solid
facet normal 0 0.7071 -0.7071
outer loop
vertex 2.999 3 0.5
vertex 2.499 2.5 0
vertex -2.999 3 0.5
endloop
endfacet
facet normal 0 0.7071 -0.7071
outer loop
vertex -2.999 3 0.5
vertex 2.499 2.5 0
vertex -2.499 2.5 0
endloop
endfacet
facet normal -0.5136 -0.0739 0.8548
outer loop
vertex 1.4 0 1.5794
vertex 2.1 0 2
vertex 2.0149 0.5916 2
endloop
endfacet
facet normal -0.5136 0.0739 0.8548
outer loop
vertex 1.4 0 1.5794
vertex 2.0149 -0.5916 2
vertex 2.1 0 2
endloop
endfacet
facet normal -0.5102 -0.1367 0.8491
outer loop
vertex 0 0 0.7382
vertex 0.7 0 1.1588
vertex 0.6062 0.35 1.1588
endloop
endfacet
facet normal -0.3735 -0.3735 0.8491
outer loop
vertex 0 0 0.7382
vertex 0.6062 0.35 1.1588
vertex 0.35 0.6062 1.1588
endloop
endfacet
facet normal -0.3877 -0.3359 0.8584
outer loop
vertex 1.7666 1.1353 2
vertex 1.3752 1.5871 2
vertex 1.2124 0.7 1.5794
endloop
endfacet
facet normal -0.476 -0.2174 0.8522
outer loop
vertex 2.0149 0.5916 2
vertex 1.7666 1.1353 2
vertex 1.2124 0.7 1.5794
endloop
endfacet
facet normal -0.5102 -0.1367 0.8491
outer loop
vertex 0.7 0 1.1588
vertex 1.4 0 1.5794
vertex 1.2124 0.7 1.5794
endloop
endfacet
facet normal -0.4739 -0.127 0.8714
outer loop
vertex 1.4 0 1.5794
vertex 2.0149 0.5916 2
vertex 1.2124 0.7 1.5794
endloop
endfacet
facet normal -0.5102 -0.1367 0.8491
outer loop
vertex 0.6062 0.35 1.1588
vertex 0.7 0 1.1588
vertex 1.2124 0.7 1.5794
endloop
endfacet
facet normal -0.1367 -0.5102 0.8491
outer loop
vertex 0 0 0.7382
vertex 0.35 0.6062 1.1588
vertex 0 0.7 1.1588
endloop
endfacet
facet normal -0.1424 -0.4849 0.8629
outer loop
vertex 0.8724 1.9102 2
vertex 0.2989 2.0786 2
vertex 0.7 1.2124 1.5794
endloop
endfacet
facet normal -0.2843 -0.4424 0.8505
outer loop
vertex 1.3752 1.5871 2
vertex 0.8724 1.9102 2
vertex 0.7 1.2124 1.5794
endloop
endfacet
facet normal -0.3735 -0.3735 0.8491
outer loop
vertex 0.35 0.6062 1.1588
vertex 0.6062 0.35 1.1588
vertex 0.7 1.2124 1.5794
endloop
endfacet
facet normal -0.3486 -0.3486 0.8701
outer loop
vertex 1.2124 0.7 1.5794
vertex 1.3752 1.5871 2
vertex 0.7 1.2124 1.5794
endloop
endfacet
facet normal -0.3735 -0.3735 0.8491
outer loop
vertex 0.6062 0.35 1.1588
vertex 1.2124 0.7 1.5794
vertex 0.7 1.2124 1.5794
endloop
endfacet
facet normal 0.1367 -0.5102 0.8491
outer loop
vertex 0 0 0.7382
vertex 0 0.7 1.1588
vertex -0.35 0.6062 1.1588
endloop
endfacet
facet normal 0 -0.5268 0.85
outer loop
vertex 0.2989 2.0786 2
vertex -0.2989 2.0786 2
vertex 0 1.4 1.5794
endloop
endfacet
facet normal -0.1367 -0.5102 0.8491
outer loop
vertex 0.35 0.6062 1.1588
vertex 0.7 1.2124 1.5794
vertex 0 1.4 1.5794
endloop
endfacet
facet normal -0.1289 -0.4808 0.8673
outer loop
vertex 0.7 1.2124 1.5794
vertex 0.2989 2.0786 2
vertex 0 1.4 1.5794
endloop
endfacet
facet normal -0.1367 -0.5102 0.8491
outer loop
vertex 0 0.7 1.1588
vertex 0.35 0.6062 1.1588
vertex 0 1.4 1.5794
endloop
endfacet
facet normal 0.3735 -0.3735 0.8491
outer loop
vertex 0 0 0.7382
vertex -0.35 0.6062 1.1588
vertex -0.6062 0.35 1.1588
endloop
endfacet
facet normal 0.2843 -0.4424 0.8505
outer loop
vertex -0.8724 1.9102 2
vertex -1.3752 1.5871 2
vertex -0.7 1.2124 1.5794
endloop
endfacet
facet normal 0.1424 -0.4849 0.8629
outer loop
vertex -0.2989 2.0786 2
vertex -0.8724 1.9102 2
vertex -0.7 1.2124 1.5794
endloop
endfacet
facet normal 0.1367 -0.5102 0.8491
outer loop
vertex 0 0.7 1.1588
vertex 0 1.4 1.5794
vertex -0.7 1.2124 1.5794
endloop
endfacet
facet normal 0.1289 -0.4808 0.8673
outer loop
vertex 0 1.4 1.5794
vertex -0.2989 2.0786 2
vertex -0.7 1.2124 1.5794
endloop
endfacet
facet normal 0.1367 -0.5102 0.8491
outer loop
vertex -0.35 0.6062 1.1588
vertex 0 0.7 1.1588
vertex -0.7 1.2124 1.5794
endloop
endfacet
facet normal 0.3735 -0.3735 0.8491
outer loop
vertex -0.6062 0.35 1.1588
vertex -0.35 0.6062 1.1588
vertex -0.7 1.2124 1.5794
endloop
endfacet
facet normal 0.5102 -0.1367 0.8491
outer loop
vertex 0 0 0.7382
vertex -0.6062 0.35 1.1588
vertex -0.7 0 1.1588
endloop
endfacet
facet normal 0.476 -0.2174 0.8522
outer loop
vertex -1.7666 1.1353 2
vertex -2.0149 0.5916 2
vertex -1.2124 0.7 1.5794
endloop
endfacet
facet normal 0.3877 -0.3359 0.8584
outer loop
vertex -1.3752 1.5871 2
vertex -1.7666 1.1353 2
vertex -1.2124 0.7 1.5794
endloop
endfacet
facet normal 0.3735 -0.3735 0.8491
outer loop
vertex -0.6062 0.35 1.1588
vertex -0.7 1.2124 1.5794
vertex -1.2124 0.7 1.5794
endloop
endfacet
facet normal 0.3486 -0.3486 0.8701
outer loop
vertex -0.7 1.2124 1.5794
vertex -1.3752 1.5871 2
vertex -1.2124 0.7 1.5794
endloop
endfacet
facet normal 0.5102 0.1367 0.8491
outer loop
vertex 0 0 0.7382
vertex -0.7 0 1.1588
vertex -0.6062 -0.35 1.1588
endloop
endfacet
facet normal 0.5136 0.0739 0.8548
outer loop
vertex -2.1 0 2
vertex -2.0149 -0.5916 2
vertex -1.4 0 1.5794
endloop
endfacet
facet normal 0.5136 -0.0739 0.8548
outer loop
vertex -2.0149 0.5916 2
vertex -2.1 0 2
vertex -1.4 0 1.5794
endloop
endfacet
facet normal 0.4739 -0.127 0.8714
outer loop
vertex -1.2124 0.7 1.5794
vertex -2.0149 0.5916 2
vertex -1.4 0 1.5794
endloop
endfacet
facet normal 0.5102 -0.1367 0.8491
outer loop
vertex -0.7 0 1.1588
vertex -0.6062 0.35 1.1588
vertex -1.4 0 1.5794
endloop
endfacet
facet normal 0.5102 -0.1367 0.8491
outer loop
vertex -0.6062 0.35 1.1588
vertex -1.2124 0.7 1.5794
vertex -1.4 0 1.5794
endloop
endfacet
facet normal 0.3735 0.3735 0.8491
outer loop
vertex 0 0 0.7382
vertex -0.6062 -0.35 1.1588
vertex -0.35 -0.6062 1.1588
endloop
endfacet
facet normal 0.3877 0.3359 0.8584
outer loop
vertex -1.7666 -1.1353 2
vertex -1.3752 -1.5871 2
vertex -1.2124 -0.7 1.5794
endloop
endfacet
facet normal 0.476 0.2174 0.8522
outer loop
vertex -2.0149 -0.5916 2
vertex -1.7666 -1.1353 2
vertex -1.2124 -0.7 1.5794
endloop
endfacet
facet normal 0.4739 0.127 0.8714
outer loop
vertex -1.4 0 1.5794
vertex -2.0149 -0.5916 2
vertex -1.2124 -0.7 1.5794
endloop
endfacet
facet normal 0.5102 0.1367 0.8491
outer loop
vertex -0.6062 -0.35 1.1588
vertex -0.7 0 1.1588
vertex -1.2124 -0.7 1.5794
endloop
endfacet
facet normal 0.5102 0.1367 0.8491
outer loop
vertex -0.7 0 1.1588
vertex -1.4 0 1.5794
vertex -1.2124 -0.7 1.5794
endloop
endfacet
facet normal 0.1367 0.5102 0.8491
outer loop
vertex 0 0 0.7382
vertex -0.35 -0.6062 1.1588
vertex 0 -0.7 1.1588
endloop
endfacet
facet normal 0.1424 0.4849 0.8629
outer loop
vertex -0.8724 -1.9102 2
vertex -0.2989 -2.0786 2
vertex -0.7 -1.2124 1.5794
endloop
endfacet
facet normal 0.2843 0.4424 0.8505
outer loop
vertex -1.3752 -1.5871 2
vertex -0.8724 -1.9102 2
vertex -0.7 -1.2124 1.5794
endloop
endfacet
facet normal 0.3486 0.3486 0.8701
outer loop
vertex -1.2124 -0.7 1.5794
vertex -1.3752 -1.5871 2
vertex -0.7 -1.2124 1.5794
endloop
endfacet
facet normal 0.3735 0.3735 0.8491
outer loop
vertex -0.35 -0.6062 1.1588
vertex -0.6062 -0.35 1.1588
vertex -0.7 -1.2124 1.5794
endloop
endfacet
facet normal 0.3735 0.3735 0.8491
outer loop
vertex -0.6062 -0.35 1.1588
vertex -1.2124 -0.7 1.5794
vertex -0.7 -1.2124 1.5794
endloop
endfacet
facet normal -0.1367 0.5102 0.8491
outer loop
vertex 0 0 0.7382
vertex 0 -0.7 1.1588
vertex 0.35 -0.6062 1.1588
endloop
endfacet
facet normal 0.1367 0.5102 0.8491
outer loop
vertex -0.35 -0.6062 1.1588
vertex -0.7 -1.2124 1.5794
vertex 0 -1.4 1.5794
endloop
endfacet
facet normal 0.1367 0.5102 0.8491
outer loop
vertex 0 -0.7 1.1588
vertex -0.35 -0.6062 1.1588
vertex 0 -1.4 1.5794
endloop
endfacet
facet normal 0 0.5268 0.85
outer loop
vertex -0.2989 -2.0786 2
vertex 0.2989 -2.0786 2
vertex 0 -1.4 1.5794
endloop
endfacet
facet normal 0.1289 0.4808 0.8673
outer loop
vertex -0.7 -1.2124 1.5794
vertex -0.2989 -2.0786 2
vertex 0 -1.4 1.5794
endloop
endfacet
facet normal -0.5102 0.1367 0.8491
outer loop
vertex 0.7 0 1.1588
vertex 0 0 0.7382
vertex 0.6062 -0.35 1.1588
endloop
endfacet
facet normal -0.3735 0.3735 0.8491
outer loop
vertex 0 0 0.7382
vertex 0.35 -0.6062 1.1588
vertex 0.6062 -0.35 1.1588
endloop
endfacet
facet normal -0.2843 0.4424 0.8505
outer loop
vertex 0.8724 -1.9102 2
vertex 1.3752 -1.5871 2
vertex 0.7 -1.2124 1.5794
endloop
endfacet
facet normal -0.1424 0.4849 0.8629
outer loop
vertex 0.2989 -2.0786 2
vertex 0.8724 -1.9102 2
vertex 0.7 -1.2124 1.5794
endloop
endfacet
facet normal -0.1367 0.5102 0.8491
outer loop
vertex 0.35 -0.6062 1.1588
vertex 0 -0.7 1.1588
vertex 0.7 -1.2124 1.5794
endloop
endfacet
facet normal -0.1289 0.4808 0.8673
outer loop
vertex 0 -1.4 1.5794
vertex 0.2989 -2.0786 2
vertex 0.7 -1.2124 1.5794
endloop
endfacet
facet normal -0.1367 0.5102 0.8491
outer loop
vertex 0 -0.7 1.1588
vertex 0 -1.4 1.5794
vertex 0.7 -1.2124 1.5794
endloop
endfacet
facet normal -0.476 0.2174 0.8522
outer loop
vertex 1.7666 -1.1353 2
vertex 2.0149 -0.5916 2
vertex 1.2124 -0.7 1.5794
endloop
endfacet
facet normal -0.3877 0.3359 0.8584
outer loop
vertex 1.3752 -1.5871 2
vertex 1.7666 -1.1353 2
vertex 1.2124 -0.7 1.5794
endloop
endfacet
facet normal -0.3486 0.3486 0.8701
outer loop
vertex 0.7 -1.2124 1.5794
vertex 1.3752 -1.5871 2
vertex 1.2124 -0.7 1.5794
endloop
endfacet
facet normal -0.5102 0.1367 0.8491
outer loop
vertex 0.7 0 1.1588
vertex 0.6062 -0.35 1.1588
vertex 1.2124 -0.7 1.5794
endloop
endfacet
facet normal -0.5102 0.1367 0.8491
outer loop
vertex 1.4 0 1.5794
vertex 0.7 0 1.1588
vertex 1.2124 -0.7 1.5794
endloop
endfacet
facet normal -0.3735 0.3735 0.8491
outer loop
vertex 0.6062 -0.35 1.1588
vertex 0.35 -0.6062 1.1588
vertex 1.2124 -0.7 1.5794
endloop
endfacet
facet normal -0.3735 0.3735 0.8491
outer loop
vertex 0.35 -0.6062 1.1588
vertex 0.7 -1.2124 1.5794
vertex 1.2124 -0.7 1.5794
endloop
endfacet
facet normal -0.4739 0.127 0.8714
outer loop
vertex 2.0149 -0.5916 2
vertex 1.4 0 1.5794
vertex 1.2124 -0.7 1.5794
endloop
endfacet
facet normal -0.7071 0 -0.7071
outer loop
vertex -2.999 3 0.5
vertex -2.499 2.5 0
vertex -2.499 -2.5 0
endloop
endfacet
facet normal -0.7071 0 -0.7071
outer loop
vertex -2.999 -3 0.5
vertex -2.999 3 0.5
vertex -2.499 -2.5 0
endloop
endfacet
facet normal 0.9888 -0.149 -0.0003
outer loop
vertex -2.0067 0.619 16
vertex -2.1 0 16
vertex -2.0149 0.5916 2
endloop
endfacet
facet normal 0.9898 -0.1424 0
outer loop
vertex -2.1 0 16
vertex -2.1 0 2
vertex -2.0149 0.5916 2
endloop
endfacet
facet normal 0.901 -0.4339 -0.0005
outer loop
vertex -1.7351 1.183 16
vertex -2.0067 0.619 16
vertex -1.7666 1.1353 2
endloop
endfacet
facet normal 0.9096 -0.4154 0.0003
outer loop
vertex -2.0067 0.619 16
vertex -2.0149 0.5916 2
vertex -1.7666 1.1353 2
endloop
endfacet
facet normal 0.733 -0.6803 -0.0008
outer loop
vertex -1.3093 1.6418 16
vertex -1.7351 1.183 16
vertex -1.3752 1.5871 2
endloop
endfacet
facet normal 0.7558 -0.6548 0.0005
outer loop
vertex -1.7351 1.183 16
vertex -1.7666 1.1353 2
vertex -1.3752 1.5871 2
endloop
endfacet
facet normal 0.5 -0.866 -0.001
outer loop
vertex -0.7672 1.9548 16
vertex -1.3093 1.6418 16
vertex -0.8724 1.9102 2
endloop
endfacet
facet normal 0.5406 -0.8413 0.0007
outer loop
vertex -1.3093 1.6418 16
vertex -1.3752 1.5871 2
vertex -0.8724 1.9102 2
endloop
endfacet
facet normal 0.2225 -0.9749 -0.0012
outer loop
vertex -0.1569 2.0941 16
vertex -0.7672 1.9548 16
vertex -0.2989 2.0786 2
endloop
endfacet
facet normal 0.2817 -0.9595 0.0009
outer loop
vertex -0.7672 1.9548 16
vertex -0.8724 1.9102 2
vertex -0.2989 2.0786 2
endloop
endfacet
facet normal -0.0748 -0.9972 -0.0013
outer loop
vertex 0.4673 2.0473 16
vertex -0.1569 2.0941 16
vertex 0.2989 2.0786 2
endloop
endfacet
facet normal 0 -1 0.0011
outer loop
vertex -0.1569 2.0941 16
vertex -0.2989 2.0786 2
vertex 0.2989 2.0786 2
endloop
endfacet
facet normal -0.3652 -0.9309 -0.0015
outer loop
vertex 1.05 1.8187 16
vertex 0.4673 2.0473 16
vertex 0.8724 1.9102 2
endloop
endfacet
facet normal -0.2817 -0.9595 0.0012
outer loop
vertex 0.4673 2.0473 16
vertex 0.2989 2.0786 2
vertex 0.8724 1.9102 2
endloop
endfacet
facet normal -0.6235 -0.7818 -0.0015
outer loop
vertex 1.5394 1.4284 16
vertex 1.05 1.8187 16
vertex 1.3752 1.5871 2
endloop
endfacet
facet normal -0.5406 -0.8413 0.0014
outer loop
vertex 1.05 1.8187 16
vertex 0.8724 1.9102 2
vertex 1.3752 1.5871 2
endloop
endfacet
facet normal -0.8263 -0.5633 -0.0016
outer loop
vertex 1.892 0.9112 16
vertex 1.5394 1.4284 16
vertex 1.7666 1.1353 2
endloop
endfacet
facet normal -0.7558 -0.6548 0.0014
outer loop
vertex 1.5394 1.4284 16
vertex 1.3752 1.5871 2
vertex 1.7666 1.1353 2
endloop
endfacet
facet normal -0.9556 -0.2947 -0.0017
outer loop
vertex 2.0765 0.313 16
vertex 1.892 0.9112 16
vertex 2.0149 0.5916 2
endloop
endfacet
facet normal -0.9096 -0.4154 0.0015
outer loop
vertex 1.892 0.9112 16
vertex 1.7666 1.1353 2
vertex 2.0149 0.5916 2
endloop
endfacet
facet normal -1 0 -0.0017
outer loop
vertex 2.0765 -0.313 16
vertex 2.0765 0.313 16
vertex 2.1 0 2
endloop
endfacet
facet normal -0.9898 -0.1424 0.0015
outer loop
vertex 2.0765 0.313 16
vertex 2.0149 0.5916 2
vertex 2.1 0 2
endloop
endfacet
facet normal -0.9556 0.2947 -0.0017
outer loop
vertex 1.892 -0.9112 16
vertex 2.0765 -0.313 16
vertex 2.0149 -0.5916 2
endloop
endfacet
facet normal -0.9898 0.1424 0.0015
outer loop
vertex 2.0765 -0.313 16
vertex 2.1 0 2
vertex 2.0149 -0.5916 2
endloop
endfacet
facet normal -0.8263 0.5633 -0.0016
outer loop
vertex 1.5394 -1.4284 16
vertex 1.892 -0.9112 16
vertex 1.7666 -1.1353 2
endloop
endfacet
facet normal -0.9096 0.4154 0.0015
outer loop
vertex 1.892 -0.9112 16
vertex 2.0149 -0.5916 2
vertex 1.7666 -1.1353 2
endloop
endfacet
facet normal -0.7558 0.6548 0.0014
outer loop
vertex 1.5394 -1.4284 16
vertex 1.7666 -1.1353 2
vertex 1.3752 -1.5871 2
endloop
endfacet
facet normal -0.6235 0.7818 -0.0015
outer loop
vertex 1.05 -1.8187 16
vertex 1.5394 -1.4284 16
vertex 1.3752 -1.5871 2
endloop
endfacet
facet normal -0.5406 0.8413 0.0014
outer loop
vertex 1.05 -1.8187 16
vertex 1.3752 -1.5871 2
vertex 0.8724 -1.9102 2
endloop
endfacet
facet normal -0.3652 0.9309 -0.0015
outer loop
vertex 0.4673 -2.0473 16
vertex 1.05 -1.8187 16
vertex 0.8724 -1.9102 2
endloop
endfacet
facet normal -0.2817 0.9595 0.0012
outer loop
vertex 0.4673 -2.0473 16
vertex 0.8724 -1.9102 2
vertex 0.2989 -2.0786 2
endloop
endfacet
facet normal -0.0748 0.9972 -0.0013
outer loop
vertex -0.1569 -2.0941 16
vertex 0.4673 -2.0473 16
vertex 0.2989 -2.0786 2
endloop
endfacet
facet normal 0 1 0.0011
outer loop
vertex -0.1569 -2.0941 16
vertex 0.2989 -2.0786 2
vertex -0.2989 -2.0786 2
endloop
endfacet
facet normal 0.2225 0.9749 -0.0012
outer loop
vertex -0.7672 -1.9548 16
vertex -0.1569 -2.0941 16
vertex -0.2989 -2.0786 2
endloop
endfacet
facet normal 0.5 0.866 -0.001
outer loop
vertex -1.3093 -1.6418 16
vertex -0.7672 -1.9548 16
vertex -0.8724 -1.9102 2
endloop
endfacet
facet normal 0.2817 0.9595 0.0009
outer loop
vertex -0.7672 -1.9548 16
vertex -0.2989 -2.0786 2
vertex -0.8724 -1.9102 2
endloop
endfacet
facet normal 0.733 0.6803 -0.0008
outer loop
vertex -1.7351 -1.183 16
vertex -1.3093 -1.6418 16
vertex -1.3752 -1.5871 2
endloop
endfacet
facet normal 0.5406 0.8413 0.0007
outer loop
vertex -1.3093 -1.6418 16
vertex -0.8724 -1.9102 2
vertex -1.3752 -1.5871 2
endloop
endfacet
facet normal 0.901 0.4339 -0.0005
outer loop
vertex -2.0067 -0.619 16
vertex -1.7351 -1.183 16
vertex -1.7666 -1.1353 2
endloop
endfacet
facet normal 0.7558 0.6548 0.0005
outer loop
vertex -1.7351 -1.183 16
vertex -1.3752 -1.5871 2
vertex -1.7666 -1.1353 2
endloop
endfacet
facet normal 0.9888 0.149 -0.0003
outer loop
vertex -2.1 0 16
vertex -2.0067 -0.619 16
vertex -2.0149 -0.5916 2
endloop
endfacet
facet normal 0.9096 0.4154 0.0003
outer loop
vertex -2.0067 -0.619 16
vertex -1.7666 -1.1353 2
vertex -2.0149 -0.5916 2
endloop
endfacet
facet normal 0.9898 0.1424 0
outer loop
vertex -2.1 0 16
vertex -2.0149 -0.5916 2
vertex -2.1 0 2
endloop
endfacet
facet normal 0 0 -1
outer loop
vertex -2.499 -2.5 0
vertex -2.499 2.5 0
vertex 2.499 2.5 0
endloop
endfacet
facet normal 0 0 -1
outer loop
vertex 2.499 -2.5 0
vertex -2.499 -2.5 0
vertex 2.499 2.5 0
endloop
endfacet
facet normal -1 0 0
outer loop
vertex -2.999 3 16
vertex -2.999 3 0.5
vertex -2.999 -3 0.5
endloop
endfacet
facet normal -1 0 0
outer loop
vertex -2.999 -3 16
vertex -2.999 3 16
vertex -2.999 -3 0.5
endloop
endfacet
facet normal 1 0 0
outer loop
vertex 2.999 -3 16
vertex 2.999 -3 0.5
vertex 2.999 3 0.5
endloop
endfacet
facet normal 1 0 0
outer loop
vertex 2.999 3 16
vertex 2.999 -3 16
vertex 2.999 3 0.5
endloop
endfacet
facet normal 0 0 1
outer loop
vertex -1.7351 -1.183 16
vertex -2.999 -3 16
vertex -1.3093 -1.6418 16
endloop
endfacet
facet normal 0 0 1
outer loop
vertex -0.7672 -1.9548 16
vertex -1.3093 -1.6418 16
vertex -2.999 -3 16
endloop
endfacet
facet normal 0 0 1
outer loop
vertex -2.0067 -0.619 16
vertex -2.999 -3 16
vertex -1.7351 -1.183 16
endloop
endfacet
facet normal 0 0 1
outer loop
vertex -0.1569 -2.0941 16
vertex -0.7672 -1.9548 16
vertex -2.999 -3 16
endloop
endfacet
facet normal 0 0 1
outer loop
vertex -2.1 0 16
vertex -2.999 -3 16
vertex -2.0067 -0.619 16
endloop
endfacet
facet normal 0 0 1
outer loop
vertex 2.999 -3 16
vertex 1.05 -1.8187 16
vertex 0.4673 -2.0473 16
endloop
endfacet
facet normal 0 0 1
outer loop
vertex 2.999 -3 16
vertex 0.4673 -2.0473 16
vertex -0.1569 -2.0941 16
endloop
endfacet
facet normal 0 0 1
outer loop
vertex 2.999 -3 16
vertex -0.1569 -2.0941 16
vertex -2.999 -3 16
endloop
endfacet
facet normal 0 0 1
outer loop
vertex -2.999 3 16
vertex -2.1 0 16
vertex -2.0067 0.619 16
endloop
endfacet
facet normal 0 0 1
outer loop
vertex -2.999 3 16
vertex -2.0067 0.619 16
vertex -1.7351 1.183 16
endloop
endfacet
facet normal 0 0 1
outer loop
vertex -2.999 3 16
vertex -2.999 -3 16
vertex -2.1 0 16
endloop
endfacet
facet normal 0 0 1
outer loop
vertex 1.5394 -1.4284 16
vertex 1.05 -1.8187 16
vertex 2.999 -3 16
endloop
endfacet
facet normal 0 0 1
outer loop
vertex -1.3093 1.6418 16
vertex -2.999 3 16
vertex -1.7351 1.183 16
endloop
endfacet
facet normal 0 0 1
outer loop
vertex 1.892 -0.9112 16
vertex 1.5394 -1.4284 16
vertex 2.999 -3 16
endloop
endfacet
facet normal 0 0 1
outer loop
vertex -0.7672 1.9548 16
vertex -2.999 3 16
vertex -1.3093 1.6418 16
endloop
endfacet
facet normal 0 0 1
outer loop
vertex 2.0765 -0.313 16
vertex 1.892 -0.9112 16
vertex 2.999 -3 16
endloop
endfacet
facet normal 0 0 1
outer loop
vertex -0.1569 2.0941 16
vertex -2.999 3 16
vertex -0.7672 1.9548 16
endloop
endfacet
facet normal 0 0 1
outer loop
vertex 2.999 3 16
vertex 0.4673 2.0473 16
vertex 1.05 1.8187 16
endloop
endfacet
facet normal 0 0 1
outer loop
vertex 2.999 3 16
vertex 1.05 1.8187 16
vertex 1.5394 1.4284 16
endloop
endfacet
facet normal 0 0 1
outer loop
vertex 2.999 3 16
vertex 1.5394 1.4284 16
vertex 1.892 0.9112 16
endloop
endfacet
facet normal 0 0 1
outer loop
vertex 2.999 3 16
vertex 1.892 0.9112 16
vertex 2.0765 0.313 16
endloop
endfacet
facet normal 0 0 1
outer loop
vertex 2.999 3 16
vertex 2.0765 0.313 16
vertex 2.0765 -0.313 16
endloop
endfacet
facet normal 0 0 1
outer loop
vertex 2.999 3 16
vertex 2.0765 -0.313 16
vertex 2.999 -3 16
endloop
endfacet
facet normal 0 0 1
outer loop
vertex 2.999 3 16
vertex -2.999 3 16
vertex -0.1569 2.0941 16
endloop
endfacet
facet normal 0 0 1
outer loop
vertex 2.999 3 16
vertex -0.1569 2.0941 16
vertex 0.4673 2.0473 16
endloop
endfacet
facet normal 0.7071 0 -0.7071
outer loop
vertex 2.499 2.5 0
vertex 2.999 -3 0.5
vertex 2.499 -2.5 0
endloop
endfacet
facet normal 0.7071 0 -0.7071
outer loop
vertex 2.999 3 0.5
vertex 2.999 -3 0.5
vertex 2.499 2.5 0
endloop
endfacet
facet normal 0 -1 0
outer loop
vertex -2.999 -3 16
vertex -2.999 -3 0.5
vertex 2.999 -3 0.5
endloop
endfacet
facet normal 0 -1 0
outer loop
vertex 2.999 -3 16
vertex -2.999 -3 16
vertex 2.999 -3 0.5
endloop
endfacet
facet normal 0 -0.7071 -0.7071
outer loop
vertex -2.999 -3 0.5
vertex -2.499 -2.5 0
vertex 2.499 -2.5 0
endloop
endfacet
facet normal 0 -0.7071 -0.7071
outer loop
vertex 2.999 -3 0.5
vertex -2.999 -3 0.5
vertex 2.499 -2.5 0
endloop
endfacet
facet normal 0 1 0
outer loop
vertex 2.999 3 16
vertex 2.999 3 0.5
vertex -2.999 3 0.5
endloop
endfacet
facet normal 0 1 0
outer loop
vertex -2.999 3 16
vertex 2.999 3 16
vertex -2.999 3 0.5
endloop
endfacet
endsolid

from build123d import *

# Parameters (mm, degrees)
BOSS_EXTRUDE1_DEPTH   = 16
M5_TAPPED_HOLE1_D     = 4.2
M5_TAPPED_HOLE1_DEPTH = 14
M5_TAPPED_HOLE1_TIP   = 1.2618073
CHAMFER1_SIZE         = 0.5


with BuildPart() as part:
    # Sketch1 → Boss-Extrude1 (new body)
    with BuildSketch(Plane.XY):
        with BuildLine():
            Line((-2.998955183, 3), (-2.998955183, 0.079169503))
            ThreePointArc((-2.998955183, 0.079169503), (-2.093142553, 2.14912872), (0, 3))
            Line((0, 3), (-2.998955183, 3))
        make_face()
        with BuildLine():
            ThreePointArc((0, 3), (2.093142553, 2.14912872), (2.998955183, 0.079169503))
            Line((2.998955183, 0.079169503), (2.998955183, 3))
            Line((2.998955183, 3), (0, 3))
        make_face()
        with BuildLine():
            ThreePointArc((-2.998955183, -0.079169503), (-2.093142553, -2.14912872), (0, -3))
            ThreePointArc((0, -3), (2.093142553, -2.14912872), (2.998955183, -0.079169503))
            Line((2.998955183, -0.079169503), (2.998955183, 0.079169503))
            ThreePointArc((2.998955183, 0.079169503), (2.093142553, 2.14912872), (0, 3))
            ThreePointArc((0, 3), (-2.093142553, 2.14912872), (-2.998955183, 0.079169503))
            Line((-2.998955183, 0.079169503), (-2.998955183, -0.079169503))
        make_face()
        with BuildLine():
            ThreePointArc((2.998955183, -0.079169503), (2.093142553, -2.14912872), (0, -3))
            Line((0, -3), (2.998955183, -3))
            Line((2.998955183, -3), (2.998955183, -0.079169503))
        make_face()
        with BuildLine():
            Line((-2.998955183, -0.079169503), (-2.998955183, -3))
            Line((-2.998955183, -3), (0, -3))
            ThreePointArc((0, -3), (-2.093142553, -2.14912872), (-2.998955183, -0.079169503))
        make_face()
    extrude(amount=BOSS_EXTRUDE1_DEPTH)

    # M5 Tapped Hole1
    with Locations(Plane.XY.offset(16)):
        with Locations((0, 0)):
            Hole(M5_TAPPED_HOLE1_D / 2, depth=M5_TAPPED_HOLE1_DEPTH)
            with Locations((0, 0, -(M5_TAPPED_HOLE1_DEPTH + M5_TAPPED_HOLE1_TIP / 2))):  # 118° drill point
                Cone(0, M5_TAPPED_HOLE1_D / 2, M5_TAPPED_HOLE1_TIP, mode=Mode.SUBTRACT)

    # Chamfer1
    chamfer1_edges = [part.edges().sort_by_distance(p)[0] for p in [
        (0, 3, 0),
        (2.998955183, 0, 0),
        (0, -3, 0),
        (-2.998955183, 0, 0),
    ]]
    chamfer(chamfer1_edges, length=CHAMFER1_SIZE)


solid = part.part
